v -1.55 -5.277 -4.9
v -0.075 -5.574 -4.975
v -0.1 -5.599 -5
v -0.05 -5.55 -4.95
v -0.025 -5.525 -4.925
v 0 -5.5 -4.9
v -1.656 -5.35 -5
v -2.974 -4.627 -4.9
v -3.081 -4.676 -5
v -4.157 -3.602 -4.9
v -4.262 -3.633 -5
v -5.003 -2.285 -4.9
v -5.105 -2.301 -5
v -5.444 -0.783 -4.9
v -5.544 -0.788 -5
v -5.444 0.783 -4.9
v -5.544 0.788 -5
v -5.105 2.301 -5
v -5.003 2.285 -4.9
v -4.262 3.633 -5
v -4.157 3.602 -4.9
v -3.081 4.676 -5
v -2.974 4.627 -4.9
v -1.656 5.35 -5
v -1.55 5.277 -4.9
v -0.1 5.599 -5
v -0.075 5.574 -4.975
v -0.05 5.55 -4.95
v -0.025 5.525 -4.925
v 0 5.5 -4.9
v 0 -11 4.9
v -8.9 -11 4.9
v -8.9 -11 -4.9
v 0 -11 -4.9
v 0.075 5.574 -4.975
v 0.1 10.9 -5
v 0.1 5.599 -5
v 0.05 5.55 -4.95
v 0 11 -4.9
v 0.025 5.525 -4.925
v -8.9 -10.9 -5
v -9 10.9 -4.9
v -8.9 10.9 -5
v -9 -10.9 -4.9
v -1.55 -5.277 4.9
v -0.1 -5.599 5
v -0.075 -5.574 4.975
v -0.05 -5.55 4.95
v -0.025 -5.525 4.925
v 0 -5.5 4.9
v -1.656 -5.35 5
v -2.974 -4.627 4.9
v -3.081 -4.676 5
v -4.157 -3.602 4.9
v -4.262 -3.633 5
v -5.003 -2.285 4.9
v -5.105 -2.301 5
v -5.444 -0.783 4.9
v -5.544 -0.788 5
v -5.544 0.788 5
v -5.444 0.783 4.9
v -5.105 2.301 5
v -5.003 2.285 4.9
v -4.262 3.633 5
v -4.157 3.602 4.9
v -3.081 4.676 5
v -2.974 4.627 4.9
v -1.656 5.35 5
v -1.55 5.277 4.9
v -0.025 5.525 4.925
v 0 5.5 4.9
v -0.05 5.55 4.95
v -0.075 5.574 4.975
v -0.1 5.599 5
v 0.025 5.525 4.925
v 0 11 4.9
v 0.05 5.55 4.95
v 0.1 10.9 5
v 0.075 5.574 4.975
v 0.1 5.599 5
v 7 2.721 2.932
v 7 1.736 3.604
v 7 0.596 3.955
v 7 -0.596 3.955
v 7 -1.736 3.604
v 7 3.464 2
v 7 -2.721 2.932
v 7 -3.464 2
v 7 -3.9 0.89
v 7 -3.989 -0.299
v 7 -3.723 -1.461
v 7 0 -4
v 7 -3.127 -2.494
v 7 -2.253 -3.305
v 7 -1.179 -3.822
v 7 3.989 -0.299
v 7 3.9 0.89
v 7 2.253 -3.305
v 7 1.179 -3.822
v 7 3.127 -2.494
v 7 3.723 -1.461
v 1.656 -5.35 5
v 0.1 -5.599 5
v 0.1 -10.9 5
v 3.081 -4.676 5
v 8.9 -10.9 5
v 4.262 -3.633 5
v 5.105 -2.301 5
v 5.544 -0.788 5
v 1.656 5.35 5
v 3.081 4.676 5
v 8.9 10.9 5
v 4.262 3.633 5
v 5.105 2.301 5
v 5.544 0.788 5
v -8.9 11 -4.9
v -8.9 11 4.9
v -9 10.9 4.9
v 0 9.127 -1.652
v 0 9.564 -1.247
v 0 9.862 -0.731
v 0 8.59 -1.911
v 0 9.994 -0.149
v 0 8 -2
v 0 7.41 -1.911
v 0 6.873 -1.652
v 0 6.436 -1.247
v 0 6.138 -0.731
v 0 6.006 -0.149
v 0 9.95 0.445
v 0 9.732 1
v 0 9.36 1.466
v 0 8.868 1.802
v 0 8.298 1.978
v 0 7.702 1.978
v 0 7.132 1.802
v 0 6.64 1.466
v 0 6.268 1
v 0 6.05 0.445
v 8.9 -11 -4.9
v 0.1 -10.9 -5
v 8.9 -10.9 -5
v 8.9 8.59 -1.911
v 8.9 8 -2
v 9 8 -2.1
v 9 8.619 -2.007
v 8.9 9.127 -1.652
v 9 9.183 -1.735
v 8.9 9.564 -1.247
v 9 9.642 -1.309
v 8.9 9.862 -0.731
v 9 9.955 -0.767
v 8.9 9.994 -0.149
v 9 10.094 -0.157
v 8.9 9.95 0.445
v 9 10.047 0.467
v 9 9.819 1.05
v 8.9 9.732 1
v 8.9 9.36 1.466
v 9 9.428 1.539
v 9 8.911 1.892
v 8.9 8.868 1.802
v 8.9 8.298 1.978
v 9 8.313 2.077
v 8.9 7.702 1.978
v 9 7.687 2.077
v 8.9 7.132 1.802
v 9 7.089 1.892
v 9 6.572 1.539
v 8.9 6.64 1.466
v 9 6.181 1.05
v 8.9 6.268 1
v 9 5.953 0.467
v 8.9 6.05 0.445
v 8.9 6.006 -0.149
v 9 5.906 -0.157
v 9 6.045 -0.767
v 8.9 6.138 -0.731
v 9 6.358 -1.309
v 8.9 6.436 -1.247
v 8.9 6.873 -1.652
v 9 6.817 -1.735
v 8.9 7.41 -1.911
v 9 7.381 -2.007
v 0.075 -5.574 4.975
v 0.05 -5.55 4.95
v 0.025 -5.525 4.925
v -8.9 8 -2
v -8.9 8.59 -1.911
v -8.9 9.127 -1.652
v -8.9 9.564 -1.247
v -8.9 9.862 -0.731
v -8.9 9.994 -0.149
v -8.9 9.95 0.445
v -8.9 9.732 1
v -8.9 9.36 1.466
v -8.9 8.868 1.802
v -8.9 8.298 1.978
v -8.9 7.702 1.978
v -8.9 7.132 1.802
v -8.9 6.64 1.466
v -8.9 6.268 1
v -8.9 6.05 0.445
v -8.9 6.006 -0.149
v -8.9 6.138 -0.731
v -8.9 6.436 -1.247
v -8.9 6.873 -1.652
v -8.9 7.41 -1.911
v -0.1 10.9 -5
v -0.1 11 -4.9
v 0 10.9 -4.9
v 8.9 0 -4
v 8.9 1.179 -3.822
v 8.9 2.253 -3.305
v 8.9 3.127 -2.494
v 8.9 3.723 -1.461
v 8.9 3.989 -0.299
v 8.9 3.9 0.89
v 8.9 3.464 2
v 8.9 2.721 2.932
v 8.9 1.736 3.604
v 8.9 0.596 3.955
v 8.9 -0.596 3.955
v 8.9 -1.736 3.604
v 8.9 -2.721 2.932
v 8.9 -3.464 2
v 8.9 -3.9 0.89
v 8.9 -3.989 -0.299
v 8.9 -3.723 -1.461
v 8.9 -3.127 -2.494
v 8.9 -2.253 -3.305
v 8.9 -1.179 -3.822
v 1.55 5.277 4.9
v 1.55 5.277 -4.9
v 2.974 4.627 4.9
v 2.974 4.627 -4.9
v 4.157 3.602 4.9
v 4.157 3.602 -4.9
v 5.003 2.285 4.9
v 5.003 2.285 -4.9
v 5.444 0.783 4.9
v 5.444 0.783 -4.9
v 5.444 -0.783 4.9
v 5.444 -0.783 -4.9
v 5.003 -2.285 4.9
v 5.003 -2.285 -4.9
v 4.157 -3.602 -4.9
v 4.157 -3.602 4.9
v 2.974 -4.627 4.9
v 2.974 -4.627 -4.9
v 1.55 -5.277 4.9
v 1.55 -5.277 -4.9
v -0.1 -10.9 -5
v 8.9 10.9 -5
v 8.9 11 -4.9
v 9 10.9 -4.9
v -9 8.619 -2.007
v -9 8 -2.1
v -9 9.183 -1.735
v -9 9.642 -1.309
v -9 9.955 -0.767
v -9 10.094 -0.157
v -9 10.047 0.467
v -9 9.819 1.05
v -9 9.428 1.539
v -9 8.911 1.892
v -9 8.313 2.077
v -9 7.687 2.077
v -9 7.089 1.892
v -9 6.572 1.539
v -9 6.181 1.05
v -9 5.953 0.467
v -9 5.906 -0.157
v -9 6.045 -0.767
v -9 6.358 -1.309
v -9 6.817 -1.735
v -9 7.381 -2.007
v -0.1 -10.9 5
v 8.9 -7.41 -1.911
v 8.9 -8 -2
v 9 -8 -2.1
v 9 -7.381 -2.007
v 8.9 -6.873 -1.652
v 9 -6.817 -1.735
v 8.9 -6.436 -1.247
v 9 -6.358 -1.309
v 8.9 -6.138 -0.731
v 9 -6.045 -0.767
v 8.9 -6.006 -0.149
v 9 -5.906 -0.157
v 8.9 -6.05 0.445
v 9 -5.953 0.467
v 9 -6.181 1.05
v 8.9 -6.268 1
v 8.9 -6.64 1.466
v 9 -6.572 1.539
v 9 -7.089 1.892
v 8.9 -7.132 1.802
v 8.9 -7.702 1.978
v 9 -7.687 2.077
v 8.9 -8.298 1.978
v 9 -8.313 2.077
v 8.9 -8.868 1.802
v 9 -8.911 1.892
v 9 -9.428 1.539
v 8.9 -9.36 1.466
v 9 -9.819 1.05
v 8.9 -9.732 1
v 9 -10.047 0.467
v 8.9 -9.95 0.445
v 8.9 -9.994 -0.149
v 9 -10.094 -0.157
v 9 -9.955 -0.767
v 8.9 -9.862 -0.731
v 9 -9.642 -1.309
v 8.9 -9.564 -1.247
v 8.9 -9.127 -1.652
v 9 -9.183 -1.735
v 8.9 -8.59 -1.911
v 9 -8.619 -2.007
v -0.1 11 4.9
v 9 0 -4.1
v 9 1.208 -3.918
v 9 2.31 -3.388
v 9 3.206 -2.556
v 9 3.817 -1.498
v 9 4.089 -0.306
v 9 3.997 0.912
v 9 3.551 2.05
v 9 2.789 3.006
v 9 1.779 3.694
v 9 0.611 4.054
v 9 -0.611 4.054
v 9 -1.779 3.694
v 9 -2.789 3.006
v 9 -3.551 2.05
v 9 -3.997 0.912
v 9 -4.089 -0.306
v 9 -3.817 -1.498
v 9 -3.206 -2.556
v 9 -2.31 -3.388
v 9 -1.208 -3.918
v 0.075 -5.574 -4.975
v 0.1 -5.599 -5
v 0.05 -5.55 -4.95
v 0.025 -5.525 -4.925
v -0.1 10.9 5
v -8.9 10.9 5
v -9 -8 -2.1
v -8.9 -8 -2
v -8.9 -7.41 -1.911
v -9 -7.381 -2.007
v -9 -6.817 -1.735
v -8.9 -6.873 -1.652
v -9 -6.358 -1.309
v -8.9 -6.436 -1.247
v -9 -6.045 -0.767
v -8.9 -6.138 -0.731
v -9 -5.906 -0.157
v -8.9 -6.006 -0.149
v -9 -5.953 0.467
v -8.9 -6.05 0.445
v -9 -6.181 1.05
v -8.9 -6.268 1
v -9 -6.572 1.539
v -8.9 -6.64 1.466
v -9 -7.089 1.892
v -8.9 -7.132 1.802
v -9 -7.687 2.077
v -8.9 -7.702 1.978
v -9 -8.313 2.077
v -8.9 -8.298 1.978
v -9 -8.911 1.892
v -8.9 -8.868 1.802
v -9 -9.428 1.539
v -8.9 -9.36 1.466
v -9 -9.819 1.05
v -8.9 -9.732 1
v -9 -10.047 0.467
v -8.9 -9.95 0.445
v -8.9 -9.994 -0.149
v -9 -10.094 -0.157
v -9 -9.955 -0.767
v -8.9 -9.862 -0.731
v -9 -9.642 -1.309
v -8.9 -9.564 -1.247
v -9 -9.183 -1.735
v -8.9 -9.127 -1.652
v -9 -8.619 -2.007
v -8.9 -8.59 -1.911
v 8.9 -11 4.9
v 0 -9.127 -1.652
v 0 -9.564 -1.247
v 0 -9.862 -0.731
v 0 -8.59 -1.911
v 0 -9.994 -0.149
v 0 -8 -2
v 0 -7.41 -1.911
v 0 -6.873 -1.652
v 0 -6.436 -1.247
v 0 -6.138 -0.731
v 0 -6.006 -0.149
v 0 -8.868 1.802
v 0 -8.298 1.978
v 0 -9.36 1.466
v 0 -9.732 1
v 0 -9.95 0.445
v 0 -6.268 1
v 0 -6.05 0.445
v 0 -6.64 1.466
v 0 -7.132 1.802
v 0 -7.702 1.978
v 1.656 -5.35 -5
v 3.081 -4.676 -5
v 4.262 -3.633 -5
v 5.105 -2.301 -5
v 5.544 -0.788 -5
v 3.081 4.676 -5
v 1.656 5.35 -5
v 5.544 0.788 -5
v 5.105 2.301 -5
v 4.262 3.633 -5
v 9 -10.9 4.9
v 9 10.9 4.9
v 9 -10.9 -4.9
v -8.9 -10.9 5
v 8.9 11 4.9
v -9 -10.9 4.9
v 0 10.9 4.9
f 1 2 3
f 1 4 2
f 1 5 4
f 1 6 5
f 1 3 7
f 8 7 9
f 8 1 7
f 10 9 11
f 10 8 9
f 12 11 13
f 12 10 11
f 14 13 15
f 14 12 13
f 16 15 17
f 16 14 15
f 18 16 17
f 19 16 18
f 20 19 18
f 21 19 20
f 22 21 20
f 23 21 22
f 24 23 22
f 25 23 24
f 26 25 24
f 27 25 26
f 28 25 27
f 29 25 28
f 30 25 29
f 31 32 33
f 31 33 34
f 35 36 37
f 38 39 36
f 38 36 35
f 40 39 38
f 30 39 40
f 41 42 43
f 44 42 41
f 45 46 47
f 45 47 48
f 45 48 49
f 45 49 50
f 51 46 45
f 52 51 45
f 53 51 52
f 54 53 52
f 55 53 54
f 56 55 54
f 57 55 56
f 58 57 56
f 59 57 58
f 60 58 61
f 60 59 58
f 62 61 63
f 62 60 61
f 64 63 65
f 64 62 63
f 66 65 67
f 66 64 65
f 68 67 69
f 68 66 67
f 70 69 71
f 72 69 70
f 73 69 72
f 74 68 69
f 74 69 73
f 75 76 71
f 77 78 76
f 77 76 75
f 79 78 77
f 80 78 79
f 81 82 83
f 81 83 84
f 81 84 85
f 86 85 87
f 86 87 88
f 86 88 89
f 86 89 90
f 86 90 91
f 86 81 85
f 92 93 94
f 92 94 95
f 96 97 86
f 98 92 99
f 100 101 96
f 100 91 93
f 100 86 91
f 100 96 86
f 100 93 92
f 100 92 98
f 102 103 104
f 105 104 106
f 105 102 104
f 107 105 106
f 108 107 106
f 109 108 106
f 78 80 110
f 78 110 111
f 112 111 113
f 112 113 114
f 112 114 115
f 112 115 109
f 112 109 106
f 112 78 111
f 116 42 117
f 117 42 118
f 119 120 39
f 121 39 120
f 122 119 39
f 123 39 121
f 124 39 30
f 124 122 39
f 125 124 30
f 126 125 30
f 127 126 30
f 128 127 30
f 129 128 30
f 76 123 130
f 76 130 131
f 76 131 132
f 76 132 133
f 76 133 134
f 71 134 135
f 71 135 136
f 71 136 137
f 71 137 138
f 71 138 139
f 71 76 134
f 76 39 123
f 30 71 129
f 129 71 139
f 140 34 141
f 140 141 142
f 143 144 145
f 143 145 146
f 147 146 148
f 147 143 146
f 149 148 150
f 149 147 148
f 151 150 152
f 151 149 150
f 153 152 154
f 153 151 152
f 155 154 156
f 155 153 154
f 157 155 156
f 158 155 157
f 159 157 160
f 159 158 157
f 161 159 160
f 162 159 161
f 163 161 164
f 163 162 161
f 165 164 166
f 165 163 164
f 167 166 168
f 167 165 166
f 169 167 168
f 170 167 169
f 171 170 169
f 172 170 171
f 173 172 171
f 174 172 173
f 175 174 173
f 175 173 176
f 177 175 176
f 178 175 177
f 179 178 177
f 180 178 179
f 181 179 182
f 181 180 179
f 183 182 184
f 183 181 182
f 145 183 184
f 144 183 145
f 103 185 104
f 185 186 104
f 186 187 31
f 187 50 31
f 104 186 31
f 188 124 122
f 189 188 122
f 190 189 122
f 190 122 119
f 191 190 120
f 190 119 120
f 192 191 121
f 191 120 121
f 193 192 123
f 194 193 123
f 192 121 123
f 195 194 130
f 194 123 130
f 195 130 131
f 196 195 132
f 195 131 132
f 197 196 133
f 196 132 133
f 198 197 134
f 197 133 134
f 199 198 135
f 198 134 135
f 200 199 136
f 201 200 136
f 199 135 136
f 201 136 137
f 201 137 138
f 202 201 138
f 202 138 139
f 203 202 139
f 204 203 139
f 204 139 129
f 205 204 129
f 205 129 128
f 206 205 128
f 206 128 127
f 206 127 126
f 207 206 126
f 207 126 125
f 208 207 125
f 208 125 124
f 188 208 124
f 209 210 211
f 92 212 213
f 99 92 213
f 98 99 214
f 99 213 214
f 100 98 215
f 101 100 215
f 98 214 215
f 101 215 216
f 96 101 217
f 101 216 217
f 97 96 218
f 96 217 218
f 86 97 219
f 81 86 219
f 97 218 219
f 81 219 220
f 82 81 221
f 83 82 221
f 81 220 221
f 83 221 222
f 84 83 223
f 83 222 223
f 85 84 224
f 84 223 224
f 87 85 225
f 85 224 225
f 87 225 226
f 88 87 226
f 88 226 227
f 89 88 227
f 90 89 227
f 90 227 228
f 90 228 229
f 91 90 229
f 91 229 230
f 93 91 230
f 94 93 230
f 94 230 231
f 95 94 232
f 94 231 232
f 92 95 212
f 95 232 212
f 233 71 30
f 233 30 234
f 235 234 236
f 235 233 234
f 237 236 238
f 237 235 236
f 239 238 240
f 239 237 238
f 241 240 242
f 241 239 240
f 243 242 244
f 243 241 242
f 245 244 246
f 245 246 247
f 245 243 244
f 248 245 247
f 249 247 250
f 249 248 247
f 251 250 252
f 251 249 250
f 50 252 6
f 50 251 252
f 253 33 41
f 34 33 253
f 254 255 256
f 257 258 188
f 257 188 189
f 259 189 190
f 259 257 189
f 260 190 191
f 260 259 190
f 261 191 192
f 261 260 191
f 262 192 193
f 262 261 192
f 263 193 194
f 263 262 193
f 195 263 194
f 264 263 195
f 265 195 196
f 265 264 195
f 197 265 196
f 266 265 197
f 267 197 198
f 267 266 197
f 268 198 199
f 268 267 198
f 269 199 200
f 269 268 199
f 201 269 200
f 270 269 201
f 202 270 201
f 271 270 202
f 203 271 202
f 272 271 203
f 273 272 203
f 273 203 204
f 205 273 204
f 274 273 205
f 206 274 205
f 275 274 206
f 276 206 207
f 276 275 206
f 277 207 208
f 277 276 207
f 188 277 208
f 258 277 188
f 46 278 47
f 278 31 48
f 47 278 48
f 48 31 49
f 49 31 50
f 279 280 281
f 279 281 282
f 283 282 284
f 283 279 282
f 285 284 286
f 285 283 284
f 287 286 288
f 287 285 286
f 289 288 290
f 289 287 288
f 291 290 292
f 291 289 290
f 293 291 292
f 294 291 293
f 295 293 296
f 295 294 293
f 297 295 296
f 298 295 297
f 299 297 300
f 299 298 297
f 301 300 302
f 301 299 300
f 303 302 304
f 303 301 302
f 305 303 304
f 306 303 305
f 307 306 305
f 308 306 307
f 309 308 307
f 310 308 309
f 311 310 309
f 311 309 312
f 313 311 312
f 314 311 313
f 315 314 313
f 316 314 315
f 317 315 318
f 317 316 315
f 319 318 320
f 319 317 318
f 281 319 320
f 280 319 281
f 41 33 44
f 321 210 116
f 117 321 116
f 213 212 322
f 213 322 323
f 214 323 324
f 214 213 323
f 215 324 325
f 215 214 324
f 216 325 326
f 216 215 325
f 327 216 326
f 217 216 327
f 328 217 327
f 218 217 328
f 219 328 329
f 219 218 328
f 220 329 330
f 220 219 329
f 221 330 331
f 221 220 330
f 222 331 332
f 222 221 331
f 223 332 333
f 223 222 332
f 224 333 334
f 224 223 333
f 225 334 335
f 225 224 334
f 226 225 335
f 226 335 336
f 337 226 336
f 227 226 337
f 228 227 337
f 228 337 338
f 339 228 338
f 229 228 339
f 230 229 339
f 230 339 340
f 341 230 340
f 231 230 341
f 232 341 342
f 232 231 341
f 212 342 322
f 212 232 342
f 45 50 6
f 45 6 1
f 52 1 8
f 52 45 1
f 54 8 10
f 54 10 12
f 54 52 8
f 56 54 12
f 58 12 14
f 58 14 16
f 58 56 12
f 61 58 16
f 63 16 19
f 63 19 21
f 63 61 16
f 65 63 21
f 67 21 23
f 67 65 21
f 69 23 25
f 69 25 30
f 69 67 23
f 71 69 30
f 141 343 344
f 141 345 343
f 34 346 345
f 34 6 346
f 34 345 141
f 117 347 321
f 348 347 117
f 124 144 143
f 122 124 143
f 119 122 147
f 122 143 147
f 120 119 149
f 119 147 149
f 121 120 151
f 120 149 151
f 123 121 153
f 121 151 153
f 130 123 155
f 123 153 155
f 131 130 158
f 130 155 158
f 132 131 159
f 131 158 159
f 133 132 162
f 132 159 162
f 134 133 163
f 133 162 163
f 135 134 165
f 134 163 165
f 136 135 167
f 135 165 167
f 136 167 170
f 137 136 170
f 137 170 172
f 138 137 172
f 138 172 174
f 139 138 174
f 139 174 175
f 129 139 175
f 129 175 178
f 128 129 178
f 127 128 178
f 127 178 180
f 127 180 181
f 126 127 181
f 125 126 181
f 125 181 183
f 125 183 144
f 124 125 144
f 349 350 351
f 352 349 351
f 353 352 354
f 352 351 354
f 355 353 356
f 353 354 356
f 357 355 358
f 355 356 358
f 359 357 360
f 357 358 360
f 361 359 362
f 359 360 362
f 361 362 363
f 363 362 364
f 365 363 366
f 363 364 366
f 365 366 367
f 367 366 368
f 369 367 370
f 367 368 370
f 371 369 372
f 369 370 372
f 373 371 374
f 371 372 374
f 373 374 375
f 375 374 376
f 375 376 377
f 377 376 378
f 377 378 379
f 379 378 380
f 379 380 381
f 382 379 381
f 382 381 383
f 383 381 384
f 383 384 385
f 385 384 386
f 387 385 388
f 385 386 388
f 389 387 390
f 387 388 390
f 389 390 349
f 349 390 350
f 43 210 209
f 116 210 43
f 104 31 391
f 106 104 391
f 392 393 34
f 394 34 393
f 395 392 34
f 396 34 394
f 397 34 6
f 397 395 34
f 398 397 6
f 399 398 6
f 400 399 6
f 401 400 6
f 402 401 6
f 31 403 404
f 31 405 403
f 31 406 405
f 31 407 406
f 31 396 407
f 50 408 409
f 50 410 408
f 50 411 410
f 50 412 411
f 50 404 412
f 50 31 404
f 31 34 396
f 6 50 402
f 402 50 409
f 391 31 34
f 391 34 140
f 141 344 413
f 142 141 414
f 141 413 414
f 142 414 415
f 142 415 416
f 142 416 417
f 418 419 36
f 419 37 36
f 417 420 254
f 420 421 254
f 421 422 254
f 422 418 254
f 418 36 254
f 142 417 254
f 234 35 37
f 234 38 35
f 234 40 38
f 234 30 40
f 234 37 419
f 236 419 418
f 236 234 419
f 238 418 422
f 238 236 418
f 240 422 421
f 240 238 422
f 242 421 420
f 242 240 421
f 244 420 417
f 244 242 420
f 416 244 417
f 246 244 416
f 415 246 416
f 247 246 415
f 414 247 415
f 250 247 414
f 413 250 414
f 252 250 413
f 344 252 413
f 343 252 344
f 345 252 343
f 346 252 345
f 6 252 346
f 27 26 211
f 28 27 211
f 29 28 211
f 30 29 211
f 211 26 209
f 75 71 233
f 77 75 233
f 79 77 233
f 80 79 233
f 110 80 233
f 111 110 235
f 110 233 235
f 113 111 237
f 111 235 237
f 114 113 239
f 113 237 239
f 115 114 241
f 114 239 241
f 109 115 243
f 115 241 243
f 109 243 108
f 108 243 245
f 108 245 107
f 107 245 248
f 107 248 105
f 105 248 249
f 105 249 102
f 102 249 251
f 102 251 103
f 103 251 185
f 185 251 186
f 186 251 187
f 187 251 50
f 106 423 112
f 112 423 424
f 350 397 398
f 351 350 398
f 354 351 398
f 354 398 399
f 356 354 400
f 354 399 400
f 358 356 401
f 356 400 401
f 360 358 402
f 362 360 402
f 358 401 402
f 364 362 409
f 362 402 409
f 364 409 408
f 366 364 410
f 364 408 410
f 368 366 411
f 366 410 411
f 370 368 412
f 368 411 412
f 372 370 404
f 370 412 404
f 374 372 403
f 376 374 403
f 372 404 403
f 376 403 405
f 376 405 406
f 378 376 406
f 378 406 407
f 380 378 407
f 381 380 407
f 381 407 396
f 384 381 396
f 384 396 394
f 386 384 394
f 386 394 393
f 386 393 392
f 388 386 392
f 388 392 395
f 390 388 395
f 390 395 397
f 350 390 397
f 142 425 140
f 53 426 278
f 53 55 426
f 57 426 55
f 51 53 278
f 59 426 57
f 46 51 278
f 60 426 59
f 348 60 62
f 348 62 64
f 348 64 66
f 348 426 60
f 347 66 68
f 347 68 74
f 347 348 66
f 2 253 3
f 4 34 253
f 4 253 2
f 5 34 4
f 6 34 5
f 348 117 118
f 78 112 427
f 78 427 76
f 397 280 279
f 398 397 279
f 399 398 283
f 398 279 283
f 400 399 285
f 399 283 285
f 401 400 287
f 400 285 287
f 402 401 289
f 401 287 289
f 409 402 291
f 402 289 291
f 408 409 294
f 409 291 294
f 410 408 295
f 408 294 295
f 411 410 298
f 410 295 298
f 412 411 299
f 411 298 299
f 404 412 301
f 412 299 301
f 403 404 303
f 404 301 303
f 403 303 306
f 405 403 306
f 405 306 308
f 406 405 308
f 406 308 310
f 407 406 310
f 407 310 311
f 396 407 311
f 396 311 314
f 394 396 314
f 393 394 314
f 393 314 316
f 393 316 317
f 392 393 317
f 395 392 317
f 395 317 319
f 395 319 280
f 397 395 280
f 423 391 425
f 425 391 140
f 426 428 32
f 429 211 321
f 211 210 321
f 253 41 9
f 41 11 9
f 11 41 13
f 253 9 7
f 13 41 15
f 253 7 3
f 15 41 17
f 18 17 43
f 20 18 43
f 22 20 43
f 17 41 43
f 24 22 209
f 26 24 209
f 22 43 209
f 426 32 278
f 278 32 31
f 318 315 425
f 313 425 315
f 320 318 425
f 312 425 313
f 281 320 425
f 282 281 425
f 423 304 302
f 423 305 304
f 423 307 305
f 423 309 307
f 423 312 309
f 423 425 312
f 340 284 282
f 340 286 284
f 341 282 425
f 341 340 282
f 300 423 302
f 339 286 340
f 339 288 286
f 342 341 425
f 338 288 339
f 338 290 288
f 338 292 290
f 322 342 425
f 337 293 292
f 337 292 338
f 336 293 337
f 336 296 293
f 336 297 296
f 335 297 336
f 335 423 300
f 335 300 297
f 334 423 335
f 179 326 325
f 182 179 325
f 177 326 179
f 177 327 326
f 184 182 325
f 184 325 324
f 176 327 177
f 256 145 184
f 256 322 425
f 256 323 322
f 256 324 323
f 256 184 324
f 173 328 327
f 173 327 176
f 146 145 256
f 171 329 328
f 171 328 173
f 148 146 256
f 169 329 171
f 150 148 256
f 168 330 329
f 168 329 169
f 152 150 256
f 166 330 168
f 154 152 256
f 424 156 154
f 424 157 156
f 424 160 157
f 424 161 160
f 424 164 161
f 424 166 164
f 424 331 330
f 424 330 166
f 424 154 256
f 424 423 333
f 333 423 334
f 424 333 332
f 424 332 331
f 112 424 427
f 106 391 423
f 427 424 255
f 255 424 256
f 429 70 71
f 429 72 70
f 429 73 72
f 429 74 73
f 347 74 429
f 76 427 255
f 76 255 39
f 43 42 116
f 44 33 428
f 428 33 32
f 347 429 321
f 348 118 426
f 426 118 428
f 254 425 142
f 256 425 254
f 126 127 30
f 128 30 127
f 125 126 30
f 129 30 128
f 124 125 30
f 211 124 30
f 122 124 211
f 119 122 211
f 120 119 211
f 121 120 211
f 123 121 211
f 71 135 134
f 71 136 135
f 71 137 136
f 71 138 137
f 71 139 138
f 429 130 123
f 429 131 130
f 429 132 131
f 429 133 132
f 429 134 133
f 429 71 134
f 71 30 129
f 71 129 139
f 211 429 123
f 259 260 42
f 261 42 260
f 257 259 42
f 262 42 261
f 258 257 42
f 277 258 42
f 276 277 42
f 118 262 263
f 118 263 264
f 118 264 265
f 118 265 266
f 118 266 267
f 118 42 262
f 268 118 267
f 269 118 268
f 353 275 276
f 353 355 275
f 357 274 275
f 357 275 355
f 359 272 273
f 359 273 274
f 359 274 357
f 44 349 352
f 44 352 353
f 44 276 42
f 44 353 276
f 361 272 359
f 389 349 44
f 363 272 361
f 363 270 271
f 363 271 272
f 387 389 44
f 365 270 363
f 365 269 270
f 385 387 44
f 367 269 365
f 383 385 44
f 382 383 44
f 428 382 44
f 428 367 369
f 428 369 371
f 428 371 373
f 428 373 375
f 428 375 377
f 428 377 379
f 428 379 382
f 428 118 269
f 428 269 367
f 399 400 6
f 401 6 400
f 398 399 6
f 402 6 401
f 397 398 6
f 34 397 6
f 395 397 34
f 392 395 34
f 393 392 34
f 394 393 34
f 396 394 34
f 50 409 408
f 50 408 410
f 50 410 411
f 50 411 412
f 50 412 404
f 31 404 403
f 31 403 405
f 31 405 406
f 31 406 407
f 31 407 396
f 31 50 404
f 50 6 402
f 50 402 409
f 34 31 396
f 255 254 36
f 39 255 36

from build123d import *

# Parameters (mm, degrees)
BOSS_EXTRUDE1_DEPTH = 5
BOSS_EXTRUDE2_DEPTH = 5
SKETCH4_R           = 2
CUT_EXTRUDE3_DEPTH  = 22.679483389
SKETCH5_R           = 4
CUT_EXTRUDE4_DEPTH  = 2
CHAMFER1_SIZE       = 0.1
CHAMFER2_SIZE       = 0.1
CHAMFER3_SIZE       = 0.1


with BuildPart() as part:
    # Sketch1 → Boss-Extrude1 (new, symmetric)
    with BuildSketch(Plane.XY):
        with BuildLine():
            Line((0, 5.5), (0, 11))
            Line((0, 11), (-9, 11))
            Line((-9, 11), (-9, -11))
            Line((-9, -11), (0, -11))
            Line((0, -11), (0, -5.5))
            ThreePointArc((0, -5.5), (-5.5, 0), (0, 5.5))
        make_face()
    extrude(amount=BOSS_EXTRUDE1_DEPTH, both=True)


with BuildPart() as body_2:
    # Sketch3 → Boss-Extrude2 (new, symmetric)
    with BuildSketch(Plane.XY):
        with BuildLine():
            Line((9, 11), (0, 11))
            Line((0, 11), (0, 5.5))
            ThreePointArc((0, 5.5), (3.889087297, 3.889087297), (5.5, 0))
            ThreePointArc((5.5, 0), (3.889087297, -3.889087297), (0, -5.5))
            Line((0, -5.5), (0, -11))
            Line((0, -11), (9, -11))
            Line((9, -11), (9, 11))
        make_face()
    extrude(amount=BOSS_EXTRUDE2_DEPTH, both=True)


with BuildPart() as cut_extrude3_tool:
    # Sketch4 → Cut-Extrude3 (new, through all)
    with BuildSketch(Plane(origin=(9, 0, 0), x_dir=(0, 0, -1), z_dir=(1, 0, 0))):
        with Locations((0, 8)):
            Circle(SKETCH4_R)
        with Locations((0, -8)):
            Circle(SKETCH4_R)
    extrude(amount=-CUT_EXTRUDE3_DEPTH)


with BuildPart() as part_1:
    add(part.part)

    # Cut-Extrude3: cut by cut_extrude3_tool
    add(cut_extrude3_tool.part, mode=Mode.SUBTRACT)

    # Chamfer2
    chamfer2_edges = [part_1.edges().sort_by_distance(p)[0] for p in [
        (-5.5, 0, -5),
        (0, 8.25, 5),
        (-9, -11, 0),
        (-9, 11, 0),
        (0, 11, 0),
        (-4.5, 11, 5),
        (-9, 0, 5),
        (-9, 8, 2),
        (-4.5, -11, 5),
        (-9, -8, 2),
        (0, -8.25, 5),
        (-5.5, 0, 5),
        (0, -8.25, -5),
        (-4.5, -11, -5),
        (-9, 0, -5),
        (-4.5, 11, -5),
        (0, 8.25, -5),
    ]]
    chamfer(chamfer2_edges, length=CHAMFER2_SIZE)


with BuildPart() as body_2_1:
    add(body_2.part)

    # Cut-Extrude3: cut by cut_extrude3_tool
    add(cut_extrude3_tool.part, mode=Mode.SUBTRACT)

    # Sketch5 → Cut-Extrude4 (cut)
    with BuildSketch(Plane(origin=(9, 0, 0), x_dir=(0, 0, -1), z_dir=(1, 0, 0))):
        Circle(SKETCH5_R)
    extrude(amount=-CUT_EXTRUDE4_DEPTH, mode=Mode.SUBTRACT)

    # Chamfer1
    chamfer1_edges = [body_2_1.edges().sort_by_distance(p)[0] for p in [
        (5.5, 0, -5),
        (0, -8.25, 5),
        (9, 11, 0),
        (9, -11, 0),
        (4.5, -11, 5),
        (9, 0, 5),
        (4.5, 11, 5),
        (0, 8.25, 5),
        (5.5, 0, 5),
        (0, 8.25, -5),
        (4.5, 11, -5),
        (9, 0, -5),
        (4.5, -11, -5),
        (0, -8.25, -5),
    ]]
    chamfer(chamfer1_edges, length=CHAMFER1_SIZE)

    # Chamfer3
    chamfer3_edges = [body_2_1.edges().sort_by_distance(p)[0] for p in [
        (9, 8, 2),
        (9, -8, 2),
        (9, 0, 4),
    ]]
    chamfer(chamfer3_edges, length=CHAMFER3_SIZE)


solid = Compound([part_1.part, body_2_1.part])
